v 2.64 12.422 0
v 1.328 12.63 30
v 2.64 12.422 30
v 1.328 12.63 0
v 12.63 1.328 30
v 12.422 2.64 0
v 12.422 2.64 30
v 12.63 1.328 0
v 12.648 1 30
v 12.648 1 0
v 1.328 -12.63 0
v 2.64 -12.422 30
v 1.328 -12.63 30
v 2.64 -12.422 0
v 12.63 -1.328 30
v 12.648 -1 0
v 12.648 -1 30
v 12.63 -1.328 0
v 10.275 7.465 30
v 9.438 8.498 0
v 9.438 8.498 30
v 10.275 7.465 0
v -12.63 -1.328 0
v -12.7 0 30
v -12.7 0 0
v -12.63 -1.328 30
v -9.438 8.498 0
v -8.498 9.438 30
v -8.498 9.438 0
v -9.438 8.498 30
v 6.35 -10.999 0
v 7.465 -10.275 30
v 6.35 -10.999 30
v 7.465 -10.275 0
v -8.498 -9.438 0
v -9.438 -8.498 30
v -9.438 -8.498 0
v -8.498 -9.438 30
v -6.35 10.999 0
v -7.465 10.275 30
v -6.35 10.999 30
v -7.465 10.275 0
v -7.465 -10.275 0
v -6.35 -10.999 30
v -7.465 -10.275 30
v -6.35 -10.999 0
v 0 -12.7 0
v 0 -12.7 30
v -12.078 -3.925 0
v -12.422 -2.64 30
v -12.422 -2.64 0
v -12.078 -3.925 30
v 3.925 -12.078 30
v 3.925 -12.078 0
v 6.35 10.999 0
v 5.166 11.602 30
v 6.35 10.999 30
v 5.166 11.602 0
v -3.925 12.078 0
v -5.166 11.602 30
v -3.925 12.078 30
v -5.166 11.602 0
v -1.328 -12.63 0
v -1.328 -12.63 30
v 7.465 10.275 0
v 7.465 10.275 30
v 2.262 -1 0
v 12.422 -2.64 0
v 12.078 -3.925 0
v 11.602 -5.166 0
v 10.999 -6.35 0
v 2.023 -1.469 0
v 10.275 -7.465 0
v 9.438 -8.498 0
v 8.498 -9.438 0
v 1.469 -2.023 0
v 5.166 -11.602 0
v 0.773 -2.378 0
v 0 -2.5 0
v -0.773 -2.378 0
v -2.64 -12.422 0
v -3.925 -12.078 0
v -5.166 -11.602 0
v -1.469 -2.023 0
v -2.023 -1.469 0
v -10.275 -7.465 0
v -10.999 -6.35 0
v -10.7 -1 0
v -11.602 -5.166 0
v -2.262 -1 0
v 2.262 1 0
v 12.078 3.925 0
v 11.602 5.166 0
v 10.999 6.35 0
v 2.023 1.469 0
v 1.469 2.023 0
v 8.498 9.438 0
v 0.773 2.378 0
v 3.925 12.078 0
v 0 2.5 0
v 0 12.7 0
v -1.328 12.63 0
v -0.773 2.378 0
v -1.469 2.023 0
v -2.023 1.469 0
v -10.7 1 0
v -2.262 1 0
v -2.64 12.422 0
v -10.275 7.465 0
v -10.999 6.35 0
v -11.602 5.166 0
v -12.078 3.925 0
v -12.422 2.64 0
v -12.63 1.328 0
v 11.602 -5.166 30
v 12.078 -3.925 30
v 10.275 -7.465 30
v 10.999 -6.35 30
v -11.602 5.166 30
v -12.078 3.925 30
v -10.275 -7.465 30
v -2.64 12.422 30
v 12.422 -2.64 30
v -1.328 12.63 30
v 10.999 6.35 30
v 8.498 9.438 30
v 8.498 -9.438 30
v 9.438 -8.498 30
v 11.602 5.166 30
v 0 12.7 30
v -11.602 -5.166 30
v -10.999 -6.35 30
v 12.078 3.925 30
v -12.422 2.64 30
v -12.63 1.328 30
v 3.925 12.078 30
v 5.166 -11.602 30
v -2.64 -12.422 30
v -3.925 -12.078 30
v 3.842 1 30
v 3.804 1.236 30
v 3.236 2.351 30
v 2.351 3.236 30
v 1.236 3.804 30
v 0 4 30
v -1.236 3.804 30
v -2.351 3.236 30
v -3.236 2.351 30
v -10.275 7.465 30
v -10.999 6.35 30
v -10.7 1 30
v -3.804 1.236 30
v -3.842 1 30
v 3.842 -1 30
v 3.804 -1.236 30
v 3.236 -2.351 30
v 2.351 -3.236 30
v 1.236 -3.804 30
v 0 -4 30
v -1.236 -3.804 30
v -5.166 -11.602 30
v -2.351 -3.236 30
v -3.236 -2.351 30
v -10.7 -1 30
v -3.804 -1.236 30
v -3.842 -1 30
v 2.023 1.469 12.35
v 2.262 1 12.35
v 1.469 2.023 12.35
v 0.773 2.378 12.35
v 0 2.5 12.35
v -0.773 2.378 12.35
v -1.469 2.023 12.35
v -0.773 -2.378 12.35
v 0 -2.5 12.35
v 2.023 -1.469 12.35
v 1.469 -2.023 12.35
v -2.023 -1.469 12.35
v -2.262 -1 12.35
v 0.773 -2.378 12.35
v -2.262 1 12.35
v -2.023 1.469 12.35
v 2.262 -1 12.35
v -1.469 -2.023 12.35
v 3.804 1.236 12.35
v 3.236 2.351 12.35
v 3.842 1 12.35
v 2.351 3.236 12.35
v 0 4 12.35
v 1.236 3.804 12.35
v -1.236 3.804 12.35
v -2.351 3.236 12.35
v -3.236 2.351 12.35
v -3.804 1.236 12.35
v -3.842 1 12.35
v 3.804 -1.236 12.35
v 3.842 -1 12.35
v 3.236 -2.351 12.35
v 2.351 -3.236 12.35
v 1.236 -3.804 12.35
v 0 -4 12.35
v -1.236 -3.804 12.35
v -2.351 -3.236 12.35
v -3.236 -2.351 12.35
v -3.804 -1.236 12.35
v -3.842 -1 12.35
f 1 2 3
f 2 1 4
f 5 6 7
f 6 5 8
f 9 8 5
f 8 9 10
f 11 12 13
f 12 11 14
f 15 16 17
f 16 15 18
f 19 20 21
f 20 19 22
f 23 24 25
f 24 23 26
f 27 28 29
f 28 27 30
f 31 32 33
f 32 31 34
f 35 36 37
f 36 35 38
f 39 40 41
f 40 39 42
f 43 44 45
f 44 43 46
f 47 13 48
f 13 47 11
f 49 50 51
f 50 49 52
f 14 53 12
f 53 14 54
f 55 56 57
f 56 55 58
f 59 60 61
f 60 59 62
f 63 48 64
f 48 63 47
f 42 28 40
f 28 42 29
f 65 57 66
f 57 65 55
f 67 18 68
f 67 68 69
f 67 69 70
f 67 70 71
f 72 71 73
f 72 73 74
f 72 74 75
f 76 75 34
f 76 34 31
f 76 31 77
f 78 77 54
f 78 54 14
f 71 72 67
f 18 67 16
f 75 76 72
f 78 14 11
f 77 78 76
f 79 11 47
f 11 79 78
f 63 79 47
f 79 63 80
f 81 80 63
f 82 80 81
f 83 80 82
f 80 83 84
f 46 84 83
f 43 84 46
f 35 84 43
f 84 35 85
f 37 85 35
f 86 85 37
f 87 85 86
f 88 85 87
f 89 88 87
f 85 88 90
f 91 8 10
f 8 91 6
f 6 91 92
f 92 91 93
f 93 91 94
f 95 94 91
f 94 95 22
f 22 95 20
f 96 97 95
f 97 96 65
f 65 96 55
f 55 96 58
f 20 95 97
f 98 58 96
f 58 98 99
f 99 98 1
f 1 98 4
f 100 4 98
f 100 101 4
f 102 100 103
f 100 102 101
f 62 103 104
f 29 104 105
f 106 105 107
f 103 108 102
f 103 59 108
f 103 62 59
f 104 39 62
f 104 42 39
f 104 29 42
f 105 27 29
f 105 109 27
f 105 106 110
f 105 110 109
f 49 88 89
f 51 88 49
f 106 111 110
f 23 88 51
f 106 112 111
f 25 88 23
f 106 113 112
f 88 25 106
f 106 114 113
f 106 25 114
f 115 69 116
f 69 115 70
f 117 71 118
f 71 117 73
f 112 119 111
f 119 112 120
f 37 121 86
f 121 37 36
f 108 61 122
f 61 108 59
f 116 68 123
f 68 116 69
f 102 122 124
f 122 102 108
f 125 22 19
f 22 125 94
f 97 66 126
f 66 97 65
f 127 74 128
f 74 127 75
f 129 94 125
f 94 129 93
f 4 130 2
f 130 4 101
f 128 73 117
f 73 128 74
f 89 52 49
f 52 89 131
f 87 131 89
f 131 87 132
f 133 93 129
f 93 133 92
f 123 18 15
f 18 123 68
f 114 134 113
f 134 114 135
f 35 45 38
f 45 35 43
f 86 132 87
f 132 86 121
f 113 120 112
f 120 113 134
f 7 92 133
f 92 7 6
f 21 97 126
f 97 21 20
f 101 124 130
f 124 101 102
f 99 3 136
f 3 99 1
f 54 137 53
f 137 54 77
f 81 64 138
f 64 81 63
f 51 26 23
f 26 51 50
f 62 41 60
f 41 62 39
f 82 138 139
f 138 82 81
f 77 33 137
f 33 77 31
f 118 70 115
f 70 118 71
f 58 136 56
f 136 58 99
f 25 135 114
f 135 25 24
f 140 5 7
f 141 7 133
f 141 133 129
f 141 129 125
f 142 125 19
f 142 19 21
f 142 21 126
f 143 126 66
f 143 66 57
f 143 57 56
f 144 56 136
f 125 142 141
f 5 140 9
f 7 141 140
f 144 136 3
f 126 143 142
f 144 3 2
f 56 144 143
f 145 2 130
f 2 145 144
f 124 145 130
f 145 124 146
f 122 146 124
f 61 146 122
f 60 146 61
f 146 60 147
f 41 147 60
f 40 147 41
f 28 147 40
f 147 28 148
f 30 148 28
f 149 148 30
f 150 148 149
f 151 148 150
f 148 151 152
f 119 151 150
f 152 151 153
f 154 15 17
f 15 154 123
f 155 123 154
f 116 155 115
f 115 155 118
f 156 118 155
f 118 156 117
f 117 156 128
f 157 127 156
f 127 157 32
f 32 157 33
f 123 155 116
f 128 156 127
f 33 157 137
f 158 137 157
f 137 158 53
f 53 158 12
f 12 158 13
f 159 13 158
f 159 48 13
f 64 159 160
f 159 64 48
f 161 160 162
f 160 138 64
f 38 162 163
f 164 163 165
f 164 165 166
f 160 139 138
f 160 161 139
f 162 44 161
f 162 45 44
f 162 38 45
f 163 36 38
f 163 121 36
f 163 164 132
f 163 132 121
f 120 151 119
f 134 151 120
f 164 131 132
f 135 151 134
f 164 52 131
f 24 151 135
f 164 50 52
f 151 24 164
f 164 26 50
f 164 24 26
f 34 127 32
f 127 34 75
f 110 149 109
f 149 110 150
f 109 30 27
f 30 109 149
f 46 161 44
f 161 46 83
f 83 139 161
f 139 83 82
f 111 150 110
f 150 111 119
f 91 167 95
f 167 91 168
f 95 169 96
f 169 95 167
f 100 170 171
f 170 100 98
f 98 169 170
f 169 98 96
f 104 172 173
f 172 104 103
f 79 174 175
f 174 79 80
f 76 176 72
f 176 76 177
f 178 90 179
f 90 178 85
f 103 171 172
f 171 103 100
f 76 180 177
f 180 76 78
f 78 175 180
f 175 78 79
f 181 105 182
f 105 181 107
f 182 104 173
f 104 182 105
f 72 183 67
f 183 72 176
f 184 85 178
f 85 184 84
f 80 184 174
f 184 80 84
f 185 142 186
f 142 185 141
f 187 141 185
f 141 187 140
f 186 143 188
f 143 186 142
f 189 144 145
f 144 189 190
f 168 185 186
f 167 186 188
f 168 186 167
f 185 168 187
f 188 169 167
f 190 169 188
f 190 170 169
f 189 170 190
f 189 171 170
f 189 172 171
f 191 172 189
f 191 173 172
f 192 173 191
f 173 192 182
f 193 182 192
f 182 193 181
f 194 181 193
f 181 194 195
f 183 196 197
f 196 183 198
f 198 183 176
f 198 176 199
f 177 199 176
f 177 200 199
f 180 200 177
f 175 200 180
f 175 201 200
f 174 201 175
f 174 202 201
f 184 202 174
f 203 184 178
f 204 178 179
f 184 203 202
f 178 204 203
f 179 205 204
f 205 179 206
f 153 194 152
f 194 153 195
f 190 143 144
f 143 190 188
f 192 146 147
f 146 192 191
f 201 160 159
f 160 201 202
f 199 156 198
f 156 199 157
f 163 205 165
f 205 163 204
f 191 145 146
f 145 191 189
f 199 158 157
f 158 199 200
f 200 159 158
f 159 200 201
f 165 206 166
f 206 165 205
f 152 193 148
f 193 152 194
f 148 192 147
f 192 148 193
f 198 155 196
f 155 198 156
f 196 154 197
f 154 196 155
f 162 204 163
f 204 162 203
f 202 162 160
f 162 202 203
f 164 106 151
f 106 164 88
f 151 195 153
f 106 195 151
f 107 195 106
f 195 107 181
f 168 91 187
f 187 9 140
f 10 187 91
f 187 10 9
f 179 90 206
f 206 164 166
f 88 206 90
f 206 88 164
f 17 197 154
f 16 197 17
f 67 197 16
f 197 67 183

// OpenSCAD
coupling_length = 30;
coupling_diameter = 25.4;
coupling_rod_depth = 17.6;
coupling_shaft_depth = coupling_length - coupling_rod_depth;
epsilon = 0.05;

metal_color = [0.8,0.8,0.8];
module mm2_coupling(shaft_diameter=5, rod_diameter=8){
  color(metal_color)
  difference(){
    cylinder(r=coupling_diameter/2, h=coupling_length, $fn=60);

    translate([0,0,-epsilon])
      cylinder(r=shaft_diameter/2, h=coupling_shaft_depth+2*epsilon, $fn=20);

    translate([0,0,coupling_length - coupling_rod_depth - epsilon])
      cylinder(r=rod_diameter/2, h=coupling_rod_depth+2*epsilon, $fn=20);

    translate([-coupling_diameter/2 + 2,-1, -epsilon])
    cube([coupling_diameter, 2, coupling_length+2*epsilon]);
  }
}

mm2_coupling();
